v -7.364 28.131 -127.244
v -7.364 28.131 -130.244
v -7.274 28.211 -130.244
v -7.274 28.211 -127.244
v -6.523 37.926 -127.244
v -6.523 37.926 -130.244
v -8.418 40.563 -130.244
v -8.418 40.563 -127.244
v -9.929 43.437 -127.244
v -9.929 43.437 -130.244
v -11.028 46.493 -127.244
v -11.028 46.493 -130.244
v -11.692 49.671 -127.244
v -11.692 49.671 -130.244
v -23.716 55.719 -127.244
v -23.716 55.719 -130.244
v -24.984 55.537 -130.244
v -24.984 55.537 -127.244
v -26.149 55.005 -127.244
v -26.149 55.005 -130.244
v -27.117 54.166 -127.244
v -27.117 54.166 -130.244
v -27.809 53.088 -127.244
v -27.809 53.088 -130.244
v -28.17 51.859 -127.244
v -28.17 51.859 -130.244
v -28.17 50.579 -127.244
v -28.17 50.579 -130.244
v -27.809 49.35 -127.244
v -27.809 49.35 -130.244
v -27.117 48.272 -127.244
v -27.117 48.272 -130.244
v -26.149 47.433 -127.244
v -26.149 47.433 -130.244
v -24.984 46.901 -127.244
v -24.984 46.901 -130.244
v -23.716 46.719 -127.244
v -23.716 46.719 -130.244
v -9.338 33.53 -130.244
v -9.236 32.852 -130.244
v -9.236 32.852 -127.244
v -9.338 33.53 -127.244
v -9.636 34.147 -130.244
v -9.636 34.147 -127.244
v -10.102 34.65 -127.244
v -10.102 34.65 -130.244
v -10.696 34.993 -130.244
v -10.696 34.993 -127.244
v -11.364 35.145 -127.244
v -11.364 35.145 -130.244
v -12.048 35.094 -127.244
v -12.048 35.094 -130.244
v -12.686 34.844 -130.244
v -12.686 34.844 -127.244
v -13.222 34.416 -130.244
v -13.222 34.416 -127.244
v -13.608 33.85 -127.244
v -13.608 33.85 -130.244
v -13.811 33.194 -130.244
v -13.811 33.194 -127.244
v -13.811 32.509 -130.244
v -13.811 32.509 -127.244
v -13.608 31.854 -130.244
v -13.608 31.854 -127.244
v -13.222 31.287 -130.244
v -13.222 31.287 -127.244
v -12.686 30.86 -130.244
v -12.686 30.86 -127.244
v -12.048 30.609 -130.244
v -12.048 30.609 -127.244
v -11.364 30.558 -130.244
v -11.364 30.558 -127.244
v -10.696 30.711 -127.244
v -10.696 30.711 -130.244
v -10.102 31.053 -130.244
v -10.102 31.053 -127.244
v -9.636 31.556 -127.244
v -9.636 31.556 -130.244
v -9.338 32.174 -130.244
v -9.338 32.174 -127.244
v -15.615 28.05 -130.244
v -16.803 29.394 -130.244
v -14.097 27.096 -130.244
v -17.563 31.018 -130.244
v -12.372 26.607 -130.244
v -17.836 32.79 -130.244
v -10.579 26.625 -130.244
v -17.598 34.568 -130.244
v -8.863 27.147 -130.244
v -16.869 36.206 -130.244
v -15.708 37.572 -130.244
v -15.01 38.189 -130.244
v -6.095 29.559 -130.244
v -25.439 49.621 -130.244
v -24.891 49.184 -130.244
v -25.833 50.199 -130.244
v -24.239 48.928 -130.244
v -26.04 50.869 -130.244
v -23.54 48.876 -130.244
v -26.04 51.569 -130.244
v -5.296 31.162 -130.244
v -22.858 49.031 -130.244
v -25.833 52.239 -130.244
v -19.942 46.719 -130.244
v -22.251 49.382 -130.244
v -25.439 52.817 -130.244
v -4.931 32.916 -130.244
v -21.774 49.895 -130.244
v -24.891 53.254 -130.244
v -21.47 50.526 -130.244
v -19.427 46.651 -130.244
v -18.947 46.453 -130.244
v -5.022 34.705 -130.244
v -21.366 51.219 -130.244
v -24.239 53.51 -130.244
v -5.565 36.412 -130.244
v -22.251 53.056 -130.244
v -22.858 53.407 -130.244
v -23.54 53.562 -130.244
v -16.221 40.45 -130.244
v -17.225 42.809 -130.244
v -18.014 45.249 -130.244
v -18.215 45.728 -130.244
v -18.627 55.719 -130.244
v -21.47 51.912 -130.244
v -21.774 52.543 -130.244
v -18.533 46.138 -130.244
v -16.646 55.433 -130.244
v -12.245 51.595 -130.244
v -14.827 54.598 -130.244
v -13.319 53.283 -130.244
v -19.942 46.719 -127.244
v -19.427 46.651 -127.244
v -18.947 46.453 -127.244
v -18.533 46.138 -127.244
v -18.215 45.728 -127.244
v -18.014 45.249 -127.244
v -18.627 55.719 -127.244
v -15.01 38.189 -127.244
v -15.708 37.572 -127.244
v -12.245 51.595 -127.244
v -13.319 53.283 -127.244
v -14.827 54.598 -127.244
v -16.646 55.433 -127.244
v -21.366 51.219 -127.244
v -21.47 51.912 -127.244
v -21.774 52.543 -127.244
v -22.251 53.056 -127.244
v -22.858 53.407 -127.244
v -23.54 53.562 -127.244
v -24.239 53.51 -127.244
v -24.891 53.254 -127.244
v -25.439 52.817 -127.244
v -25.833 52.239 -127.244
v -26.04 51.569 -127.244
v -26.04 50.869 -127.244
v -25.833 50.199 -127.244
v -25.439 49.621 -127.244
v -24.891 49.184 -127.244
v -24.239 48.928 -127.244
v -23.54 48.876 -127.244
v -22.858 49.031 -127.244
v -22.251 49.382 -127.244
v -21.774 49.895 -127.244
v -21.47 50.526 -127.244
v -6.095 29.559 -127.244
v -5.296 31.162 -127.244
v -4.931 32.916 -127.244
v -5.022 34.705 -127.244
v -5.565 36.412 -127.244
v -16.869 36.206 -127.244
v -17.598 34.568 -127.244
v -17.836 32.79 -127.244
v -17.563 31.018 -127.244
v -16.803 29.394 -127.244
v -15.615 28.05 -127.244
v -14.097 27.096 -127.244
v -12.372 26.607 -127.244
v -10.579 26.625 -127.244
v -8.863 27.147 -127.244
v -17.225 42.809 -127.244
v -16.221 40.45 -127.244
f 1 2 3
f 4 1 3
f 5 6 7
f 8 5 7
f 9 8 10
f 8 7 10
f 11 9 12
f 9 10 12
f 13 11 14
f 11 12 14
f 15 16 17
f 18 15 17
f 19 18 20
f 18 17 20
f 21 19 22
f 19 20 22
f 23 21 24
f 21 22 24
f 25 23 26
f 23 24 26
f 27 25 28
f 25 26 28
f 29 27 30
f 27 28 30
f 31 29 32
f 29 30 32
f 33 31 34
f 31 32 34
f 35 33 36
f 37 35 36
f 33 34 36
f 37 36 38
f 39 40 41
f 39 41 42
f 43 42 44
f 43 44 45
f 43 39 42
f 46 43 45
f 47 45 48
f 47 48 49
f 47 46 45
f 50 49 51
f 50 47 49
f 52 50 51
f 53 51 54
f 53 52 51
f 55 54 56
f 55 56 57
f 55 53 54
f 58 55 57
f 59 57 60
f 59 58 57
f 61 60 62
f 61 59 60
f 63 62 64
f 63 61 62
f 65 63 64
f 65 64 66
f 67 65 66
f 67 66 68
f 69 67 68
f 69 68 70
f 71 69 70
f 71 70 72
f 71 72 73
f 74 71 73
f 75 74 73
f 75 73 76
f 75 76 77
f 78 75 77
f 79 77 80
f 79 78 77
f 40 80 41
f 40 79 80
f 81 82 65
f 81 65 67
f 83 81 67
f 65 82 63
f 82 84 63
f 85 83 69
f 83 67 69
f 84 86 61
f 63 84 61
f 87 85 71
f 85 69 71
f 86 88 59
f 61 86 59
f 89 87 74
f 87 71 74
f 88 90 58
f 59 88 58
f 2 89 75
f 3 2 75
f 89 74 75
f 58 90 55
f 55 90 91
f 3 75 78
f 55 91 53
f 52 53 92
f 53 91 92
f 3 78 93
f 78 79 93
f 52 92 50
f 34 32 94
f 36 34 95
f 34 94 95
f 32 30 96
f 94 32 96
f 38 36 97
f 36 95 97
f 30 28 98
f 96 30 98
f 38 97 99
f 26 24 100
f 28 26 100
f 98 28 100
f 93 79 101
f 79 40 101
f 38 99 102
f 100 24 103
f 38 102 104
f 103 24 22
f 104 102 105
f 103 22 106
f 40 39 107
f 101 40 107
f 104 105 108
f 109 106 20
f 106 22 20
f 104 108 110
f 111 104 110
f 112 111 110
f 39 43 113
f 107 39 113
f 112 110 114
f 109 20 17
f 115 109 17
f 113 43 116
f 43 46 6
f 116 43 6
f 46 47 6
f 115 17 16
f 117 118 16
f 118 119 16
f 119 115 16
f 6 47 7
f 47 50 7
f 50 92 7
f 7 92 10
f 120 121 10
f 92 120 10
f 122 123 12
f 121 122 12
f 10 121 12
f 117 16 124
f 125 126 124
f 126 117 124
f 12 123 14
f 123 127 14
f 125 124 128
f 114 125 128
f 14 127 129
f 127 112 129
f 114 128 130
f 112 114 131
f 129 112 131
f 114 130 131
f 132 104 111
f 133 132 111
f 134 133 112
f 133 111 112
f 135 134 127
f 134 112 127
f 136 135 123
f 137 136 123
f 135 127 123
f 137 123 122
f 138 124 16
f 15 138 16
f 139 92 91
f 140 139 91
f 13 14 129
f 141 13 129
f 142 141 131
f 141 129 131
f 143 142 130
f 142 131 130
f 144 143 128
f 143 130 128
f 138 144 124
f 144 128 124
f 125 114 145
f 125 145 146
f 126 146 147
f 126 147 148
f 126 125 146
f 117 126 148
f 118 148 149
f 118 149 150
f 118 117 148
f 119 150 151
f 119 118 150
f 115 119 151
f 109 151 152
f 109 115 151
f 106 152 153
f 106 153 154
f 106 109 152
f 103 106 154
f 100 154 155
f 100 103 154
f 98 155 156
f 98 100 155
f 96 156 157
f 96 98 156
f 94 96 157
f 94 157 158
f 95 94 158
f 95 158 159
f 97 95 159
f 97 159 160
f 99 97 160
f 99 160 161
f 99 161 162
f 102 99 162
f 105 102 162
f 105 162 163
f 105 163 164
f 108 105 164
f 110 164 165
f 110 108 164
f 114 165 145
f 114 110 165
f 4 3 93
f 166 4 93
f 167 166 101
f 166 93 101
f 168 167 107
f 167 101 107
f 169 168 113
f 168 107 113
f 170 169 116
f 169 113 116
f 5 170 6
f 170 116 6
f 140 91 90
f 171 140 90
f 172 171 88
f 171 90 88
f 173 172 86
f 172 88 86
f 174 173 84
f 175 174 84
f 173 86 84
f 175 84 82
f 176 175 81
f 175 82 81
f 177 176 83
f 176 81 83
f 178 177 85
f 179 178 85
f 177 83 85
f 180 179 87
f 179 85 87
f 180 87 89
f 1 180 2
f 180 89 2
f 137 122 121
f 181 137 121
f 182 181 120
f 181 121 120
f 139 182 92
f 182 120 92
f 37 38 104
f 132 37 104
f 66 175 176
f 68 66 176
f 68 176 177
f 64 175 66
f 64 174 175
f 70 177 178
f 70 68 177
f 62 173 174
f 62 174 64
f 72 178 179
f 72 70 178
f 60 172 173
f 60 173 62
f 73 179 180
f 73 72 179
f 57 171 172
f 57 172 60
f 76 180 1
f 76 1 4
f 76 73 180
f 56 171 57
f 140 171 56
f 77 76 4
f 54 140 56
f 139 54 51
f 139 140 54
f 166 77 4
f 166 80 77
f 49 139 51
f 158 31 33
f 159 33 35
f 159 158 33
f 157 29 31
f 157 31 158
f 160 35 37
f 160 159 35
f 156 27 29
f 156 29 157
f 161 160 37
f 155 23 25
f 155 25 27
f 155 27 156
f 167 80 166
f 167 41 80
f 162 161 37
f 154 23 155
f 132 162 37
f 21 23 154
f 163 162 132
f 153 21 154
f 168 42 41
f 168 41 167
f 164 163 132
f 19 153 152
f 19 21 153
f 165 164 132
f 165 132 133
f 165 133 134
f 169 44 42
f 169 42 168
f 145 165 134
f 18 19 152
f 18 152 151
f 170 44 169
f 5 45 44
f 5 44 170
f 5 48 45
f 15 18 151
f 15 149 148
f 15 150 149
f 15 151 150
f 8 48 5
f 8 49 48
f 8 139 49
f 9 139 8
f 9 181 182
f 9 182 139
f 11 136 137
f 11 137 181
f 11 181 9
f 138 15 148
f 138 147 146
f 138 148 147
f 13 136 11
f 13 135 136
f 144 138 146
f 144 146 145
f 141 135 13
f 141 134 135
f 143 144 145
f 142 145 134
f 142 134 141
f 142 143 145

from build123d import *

# Parameters (mm, degrees)
SKETCH1_R           = 2.35
SKETCH1_R_2         = 2.3
BOSS_EXTRUDE2_DEPTH = 3


with BuildPart() as part:
    # Sketch1 → Boss-Extrude2 (new body)
    with BuildSketch(Plane.XY.offset(-130.24387898)):
        with BuildLine():
            Line((-15.010059364, 38.189351968), (-15.708117617, 37.572463316))
            ThreePointArc((-15.708117617, 37.572463316), (-16.257044738, 28.67984396), (-7.364425381, 28.130916839))
            Line((-7.364425381, 28.130916839), (-7.27434556, 28.210522262))
            ThreePointArc((-7.27434556, 28.210522262), (-4.930575043, 32.916016457), (-6.522896429, 37.925951432))
            ThreePointArc((-6.522896429, 37.925951432), (-9.929258204, 43.436995693), (-11.691880866, 49.671421949))
            ThreePointArc((-11.691880866, 49.671421949), (-14.02608552, 53.994717475), (-18.626779298, 55.718960016))
            Line((-18.626779298, 55.718960016), (-23.716053845, 55.718960016))
            ThreePointArc((-23.716053845, 55.718960016), (-28.216053845, 51.218960016), (-23.716053845, 46.718960016))
            Line((-23.716053845, 46.718960016), (-19.942226175, 46.718960016))
            ThreePointArc((-19.942226175, 46.718960016), (-18.729620599, 46.309427783), (-18.013616093, 45.248547734))
            ThreePointArc((-18.013616093, 45.248547734), (-16.74918621, 41.617962479), (-15.010059364, 38.189351968))
        make_face()
        with Locations((-23.716053845, 51.218960016)):
            Circle(SKETCH1_R, mode=Mode.SUBTRACT)
        with Locations((-11.536271499, 32.851690078)):
            Circle(SKETCH1_R_2, mode=Mode.SUBTRACT)
    extrude(amount=BOSS_EXTRUDE2_DEPTH)


solid = part.part
